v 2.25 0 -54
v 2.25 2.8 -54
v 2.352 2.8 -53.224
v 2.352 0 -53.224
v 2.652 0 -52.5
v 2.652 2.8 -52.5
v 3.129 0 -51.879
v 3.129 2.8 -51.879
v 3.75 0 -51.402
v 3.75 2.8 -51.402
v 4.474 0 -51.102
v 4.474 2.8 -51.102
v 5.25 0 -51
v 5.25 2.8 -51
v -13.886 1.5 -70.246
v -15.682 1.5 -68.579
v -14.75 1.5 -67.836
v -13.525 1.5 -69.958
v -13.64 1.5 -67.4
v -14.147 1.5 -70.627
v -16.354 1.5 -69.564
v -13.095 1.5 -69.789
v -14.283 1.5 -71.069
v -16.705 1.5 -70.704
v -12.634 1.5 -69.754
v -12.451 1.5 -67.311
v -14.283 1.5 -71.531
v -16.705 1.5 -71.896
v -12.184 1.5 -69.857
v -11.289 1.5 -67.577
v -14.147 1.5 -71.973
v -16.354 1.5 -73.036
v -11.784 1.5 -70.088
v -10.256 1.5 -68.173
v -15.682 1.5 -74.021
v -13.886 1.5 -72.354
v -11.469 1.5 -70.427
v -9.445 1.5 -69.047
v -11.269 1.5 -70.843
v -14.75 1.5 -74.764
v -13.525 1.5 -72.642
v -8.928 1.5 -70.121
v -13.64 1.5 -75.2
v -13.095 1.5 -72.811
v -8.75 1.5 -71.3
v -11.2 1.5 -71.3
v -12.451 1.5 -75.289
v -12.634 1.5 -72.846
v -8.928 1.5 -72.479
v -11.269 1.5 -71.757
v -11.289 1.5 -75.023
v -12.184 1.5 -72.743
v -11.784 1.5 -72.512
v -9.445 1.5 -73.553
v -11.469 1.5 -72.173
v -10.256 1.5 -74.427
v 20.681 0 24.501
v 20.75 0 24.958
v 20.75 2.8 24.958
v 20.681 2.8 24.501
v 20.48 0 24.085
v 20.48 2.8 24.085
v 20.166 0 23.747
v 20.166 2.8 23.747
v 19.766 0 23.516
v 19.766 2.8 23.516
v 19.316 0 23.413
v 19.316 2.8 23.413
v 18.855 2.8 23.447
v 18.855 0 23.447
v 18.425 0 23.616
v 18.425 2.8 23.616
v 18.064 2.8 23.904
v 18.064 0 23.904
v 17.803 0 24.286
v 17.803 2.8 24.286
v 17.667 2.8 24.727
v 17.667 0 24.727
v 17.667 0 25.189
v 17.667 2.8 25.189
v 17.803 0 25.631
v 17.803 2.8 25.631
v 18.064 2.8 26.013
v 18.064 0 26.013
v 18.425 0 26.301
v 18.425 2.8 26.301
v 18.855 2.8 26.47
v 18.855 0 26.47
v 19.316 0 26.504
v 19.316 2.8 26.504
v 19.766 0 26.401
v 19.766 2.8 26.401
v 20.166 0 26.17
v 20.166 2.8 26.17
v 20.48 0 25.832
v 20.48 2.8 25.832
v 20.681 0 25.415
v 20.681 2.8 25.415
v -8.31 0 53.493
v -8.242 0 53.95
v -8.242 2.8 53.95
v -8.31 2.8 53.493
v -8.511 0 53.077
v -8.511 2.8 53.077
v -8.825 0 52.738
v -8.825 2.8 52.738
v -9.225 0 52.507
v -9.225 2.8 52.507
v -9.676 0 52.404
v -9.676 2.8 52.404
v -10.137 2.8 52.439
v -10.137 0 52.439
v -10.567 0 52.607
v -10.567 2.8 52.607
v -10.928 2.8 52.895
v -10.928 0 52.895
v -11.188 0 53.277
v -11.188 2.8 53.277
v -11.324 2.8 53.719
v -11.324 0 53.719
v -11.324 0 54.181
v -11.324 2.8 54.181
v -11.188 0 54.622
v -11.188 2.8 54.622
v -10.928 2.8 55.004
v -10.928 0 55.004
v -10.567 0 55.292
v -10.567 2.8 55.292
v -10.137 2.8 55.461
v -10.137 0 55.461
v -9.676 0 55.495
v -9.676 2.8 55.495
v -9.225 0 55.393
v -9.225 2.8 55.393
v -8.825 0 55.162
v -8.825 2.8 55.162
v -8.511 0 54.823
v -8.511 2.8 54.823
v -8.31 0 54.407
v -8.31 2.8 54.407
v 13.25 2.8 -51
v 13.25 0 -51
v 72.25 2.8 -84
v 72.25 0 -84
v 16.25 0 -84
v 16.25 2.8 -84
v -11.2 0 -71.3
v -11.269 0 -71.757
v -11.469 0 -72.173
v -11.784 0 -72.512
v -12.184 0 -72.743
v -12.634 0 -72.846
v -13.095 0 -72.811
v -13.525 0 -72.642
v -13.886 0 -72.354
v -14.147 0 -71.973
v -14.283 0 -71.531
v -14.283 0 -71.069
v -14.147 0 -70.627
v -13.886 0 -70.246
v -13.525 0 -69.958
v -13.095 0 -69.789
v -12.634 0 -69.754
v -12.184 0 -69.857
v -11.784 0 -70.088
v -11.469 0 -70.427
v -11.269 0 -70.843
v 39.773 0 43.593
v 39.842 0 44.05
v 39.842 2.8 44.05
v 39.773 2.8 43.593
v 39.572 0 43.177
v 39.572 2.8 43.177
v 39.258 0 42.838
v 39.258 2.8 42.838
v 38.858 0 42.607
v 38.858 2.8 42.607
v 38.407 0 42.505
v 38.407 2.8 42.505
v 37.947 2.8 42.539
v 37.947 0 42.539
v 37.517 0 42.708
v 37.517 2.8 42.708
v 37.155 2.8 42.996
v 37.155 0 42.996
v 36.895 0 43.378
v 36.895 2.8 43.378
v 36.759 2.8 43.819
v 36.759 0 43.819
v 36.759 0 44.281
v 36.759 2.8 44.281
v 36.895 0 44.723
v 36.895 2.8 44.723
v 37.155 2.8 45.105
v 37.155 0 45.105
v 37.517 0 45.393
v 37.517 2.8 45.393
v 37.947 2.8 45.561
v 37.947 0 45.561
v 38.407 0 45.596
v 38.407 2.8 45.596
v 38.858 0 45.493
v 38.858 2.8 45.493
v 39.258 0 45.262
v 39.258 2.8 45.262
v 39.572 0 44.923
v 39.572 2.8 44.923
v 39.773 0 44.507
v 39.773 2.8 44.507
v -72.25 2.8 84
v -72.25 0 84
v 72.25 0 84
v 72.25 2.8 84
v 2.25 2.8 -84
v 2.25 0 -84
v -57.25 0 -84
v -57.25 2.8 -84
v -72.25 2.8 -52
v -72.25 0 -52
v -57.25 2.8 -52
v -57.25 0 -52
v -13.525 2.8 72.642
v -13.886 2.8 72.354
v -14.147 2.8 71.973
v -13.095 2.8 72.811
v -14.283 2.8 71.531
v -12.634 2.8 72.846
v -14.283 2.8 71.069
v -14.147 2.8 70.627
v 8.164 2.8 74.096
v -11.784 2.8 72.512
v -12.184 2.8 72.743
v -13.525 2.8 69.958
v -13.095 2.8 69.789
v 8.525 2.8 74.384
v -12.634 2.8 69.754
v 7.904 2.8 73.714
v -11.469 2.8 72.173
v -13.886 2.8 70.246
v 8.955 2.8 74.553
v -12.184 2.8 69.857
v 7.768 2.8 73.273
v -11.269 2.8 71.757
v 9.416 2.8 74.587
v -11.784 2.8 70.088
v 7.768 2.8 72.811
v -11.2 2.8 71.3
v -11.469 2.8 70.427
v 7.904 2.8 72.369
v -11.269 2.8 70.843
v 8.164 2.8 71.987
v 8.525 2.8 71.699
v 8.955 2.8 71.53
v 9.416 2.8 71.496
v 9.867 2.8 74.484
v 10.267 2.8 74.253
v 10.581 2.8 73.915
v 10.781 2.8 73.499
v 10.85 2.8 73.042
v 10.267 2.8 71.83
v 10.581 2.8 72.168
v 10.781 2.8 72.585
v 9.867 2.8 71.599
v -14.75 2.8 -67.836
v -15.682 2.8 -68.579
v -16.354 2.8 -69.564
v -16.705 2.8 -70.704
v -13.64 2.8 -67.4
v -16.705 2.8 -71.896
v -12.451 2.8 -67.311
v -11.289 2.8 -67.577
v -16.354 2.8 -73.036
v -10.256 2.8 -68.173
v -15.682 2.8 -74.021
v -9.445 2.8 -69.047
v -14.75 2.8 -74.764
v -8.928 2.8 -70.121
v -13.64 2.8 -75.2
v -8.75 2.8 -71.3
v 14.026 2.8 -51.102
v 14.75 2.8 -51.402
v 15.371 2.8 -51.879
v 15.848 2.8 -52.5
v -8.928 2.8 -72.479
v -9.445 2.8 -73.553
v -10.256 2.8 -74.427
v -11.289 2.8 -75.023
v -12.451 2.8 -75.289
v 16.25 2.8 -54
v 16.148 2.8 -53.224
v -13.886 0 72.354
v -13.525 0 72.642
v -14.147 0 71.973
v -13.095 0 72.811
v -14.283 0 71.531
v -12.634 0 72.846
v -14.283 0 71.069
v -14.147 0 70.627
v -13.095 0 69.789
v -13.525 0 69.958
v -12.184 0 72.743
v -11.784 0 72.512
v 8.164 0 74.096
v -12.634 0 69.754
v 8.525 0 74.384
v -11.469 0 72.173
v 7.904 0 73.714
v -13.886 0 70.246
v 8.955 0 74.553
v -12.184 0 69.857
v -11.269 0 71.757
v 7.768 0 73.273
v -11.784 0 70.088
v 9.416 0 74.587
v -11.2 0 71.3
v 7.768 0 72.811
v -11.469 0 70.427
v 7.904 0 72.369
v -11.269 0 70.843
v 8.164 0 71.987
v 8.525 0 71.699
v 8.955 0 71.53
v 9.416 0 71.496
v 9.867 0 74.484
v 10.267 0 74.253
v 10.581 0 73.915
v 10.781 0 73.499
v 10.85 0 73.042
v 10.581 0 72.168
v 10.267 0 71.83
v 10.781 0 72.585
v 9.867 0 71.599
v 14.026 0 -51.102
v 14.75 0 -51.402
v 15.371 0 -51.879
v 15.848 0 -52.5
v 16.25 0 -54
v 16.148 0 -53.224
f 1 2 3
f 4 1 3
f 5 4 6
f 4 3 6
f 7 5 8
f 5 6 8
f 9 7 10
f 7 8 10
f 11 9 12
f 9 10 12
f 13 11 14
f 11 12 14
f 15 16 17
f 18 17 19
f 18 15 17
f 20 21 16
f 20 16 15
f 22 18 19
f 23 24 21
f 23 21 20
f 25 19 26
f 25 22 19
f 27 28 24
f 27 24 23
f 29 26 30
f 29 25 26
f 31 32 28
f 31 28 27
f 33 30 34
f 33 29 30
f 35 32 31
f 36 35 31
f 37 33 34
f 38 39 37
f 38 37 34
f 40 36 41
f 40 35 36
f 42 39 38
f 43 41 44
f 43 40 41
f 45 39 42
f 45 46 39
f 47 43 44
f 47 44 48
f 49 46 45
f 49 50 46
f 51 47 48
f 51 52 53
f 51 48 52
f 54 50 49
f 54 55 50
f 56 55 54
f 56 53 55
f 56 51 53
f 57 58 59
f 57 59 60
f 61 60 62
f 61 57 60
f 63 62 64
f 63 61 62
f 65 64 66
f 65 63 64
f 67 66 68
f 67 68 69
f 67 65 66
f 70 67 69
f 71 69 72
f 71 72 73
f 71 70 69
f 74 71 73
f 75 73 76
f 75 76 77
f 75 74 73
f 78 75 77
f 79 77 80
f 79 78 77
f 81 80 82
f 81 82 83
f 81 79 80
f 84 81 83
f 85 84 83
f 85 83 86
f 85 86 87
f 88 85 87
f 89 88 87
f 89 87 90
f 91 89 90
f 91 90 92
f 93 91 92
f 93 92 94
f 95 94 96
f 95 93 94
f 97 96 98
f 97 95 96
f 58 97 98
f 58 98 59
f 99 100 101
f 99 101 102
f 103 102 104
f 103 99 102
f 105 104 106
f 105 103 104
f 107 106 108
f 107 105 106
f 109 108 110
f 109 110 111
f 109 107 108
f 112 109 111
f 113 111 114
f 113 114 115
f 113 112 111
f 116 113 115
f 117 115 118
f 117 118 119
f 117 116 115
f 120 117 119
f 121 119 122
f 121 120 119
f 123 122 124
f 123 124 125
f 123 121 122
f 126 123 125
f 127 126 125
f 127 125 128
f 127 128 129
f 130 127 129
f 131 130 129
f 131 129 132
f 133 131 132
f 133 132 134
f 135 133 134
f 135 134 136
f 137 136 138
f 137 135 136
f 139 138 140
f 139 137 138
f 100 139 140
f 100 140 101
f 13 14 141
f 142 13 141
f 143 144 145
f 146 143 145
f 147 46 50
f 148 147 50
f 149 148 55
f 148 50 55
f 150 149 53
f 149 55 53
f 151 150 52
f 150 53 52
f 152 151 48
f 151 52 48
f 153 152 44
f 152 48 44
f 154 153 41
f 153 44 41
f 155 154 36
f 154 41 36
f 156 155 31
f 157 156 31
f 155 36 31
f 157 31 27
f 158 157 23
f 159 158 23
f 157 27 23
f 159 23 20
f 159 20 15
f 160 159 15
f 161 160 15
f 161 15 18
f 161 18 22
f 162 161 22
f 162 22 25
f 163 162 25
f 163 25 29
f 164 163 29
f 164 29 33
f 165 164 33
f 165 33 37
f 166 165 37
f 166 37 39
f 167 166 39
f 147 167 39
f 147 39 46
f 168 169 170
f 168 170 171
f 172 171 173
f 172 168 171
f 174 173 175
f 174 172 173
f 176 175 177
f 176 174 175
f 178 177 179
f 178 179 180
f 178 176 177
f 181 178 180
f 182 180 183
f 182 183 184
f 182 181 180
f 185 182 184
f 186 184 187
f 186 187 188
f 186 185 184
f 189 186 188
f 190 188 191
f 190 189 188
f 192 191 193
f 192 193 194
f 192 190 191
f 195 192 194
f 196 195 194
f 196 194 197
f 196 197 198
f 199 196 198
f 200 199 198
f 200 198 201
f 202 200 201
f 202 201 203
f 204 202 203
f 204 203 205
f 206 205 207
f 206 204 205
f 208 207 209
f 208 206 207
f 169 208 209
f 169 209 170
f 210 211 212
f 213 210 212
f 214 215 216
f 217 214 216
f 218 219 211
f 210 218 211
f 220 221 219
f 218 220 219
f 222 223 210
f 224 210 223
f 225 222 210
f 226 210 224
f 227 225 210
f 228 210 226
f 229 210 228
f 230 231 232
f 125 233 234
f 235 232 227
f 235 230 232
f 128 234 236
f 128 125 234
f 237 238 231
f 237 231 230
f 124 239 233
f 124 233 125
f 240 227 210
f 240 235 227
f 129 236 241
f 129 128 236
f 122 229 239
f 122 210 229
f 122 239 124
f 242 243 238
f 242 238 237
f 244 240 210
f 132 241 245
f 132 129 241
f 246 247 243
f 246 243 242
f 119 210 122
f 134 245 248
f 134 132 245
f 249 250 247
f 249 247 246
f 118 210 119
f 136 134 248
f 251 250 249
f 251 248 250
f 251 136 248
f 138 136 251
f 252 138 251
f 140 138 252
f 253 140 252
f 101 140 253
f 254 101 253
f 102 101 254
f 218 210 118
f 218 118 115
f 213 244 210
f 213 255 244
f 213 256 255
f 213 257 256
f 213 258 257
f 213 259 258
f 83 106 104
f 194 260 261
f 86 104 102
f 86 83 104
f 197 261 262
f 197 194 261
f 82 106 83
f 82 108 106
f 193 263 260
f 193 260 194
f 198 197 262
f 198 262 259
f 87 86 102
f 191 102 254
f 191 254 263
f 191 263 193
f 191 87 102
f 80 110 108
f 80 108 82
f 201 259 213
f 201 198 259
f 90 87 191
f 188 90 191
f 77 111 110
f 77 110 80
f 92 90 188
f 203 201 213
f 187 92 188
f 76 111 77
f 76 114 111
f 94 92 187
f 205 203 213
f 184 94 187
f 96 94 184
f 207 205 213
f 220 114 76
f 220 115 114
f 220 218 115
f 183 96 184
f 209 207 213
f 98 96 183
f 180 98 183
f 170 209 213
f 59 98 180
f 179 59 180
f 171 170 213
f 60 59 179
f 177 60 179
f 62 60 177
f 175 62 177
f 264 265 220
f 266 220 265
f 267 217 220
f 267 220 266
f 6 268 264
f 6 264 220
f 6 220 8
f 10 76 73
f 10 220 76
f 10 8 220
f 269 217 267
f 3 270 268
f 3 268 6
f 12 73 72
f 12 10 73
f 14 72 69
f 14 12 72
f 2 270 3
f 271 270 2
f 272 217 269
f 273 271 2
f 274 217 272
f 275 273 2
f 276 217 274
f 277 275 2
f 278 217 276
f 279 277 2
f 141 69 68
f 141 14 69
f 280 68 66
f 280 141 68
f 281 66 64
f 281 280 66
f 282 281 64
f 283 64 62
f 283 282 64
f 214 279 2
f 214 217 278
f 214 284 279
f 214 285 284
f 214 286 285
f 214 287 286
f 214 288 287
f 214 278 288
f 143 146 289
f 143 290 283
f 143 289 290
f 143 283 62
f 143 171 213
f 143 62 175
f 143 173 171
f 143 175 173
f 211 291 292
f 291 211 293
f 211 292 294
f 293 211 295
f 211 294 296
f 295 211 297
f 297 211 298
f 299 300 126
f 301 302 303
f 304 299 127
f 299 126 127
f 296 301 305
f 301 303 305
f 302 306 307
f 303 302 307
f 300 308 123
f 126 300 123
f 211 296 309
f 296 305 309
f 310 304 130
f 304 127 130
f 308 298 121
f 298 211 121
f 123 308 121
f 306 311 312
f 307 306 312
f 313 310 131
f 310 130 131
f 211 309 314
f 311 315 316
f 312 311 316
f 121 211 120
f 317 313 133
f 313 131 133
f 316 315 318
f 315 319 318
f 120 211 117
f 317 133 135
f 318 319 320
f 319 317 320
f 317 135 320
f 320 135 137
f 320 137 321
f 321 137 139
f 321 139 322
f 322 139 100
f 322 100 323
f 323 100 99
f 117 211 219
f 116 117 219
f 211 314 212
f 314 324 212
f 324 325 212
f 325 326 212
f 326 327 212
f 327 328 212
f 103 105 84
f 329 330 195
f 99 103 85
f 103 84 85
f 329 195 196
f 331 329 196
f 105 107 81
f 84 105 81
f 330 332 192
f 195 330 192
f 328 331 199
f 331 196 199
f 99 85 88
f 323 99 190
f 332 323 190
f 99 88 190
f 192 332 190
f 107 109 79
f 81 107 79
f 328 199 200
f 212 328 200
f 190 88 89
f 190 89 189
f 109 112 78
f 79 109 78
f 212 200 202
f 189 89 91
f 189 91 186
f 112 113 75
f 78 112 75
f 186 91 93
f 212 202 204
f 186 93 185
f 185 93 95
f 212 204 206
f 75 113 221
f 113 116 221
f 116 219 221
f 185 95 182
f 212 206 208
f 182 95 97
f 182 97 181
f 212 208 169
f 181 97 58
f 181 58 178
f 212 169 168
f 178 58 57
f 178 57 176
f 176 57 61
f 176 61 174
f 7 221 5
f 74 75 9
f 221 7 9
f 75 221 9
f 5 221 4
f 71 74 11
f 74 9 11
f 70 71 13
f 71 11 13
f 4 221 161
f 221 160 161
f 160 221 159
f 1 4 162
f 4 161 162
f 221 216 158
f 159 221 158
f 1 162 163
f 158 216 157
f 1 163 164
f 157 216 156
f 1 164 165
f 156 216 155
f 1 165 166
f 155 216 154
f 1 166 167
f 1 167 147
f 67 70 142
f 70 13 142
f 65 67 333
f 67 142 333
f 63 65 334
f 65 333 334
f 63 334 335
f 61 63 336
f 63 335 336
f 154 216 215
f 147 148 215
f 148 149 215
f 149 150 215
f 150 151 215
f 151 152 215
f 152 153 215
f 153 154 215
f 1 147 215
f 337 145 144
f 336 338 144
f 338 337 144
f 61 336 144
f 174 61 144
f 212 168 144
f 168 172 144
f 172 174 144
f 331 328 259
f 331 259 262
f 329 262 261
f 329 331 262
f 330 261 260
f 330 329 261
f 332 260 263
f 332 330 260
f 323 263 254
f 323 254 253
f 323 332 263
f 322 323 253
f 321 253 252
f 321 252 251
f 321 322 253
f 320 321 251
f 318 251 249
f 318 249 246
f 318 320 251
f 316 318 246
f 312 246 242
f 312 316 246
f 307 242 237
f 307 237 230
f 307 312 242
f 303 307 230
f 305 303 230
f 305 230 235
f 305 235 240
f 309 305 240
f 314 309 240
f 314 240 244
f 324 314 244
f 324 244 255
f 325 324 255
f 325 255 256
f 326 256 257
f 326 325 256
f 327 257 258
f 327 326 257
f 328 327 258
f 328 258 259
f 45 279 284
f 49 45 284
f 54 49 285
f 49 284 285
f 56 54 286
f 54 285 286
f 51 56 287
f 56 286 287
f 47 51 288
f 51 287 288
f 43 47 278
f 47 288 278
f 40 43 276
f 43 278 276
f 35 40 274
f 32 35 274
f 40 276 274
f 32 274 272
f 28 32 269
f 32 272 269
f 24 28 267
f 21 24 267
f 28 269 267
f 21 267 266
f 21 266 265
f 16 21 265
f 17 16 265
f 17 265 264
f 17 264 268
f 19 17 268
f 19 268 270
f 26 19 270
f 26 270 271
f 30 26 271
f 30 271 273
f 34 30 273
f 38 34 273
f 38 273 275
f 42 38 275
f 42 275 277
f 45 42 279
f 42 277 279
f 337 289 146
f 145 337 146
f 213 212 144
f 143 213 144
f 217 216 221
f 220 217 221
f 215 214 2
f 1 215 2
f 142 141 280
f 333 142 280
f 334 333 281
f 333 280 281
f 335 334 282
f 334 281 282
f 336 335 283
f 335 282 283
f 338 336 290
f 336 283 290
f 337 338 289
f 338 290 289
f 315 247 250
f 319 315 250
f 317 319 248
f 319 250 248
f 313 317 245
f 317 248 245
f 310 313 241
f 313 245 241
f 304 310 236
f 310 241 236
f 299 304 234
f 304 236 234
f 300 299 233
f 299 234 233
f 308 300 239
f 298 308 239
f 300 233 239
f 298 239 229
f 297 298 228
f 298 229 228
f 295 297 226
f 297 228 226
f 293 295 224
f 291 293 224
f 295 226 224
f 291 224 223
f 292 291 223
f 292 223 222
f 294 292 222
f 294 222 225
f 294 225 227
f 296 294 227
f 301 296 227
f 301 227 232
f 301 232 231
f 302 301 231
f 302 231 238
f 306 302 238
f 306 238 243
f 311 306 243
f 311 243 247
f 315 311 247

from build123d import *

# Parameters (mm, degrees)
SKETCH1_R           = 1.55
BOSS_EXTRUDE1_DEPTH = 2.8
CUT_EXTRUDE1_REACH  = 4.8
SKETCH2_R           = 1.55
SKETCH3_R           = 4
CUT_EXTRUDE2_DEPTH  = 1.3
CUT_EXTRUDE3_REACH  = 4.8


with BuildPart() as part:
    # Sketch1 → Boss-Extrude1 (new body)
    with BuildSketch(Plane(origin=(0, 0, 0), x_dir=(1, 0, 0), z_dir=(0, 1, 0))):
        Polygon((-72.25, 52), (-72.25, -84), (72.25, -84), (72.25, 84), (-57.25, 84), (-57.25, 52), align=None)
        with Locations((-9.79163056, -53.949747468)):
            Circle(SKETCH1_R, mode=Mode.SUBTRACT)
        with Locations((9.300252532, -73.04163056)):
            Circle(SKETCH1_R, mode=Mode.SUBTRACT)
        with Locations((38.29163056, -44.050252532)):
            Circle(SKETCH1_R, mode=Mode.SUBTRACT)
        with Locations((19.199747468, -24.95836944)):
            Circle(SKETCH1_R, mode=Mode.SUBTRACT)
    extrude(amount=BOSS_EXTRUDE1_DEPTH)

    # Sketch2 → Cut-Extrude1 (cut, up to next)
    with BuildSketch(Plane(origin=(0, 2.8, 0), x_dir=(1, 0, 0), z_dir=(0, 1, 0)), mode=Mode.PRIVATE) as cut_extrude1_sk1:
        with Locations((-12.75, 71.3)):
            Circle(SKETCH2_R)
    cut_extrude1_tool1 = extrude(cut_extrude1_sk1.sketch, amount=-CUT_EXTRUDE1_REACH, mode=Mode.PRIVATE) & part.part
    add(cut_extrude1_tool1.solids().sort_by_distance((-12.75, 2.8, -71.3))[0], mode=Mode.SUBTRACT)
    # Sketch2 → Cut-Extrude1 (cut, up to next)
    with BuildSketch(Plane(origin=(0, 2.8, 0), x_dir=(1, 0, 0), z_dir=(0, 1, 0)), mode=Mode.PRIVATE) as cut_extrude1_sk2:
        with Locations((-12.75, -71.3)):
            Circle(SKETCH2_R)
    cut_extrude1_tool2 = extrude(cut_extrude1_sk2.sketch, amount=-CUT_EXTRUDE1_REACH, mode=Mode.PRIVATE) & part.part
    add(cut_extrude1_tool2.solids().sort_by_distance((-12.75, 2.8, 71.3))[0], mode=Mode.SUBTRACT)

    # Sketch3 → Cut-Extrude2 (cut)
    with BuildSketch(Plane(origin=(0, 2.8, 0), x_dir=(1, 0, 0), z_dir=(0, 1, 0))):
        with Locations((-12.75, 71.3)):
            Circle(SKETCH3_R)
    extrude(amount=-CUT_EXTRUDE2_DEPTH, mode=Mode.SUBTRACT)

    # Sketch4 → Cut-Extrude3 (cut, up to next)
    with BuildSketch(Plane(origin=(0, 2.8, 0), x_dir=(1, 0, 0), z_dir=(0, 1, 0)), mode=Mode.PRIVATE) as cut_extrude3_sk1:
        with BuildLine():
            Line((16.25, 84), (2.25, 84))
            Line((2.25, 84), (2.25, 54))
            ThreePointArc((2.25, 54), (3.128679656, 51.878679656), (5.25, 51))
            Line((5.25, 51), (13.25, 51))
            ThreePointArc((13.25, 51), (15.371320344, 51.878679656), (16.25, 54))
            Line((16.25, 54), (16.25, 84))
        make_face()
    cut_extrude3_tool1 = extrude(cut_extrude3_sk1.sketch, amount=-CUT_EXTRUDE3_REACH, mode=Mode.PRIVATE) & part.part
    add(cut_extrude3_tool1.solids().sort_by_distance((9.25, 2.8, -67.633471))[0], mode=Mode.SUBTRACT)


solid = part.part
